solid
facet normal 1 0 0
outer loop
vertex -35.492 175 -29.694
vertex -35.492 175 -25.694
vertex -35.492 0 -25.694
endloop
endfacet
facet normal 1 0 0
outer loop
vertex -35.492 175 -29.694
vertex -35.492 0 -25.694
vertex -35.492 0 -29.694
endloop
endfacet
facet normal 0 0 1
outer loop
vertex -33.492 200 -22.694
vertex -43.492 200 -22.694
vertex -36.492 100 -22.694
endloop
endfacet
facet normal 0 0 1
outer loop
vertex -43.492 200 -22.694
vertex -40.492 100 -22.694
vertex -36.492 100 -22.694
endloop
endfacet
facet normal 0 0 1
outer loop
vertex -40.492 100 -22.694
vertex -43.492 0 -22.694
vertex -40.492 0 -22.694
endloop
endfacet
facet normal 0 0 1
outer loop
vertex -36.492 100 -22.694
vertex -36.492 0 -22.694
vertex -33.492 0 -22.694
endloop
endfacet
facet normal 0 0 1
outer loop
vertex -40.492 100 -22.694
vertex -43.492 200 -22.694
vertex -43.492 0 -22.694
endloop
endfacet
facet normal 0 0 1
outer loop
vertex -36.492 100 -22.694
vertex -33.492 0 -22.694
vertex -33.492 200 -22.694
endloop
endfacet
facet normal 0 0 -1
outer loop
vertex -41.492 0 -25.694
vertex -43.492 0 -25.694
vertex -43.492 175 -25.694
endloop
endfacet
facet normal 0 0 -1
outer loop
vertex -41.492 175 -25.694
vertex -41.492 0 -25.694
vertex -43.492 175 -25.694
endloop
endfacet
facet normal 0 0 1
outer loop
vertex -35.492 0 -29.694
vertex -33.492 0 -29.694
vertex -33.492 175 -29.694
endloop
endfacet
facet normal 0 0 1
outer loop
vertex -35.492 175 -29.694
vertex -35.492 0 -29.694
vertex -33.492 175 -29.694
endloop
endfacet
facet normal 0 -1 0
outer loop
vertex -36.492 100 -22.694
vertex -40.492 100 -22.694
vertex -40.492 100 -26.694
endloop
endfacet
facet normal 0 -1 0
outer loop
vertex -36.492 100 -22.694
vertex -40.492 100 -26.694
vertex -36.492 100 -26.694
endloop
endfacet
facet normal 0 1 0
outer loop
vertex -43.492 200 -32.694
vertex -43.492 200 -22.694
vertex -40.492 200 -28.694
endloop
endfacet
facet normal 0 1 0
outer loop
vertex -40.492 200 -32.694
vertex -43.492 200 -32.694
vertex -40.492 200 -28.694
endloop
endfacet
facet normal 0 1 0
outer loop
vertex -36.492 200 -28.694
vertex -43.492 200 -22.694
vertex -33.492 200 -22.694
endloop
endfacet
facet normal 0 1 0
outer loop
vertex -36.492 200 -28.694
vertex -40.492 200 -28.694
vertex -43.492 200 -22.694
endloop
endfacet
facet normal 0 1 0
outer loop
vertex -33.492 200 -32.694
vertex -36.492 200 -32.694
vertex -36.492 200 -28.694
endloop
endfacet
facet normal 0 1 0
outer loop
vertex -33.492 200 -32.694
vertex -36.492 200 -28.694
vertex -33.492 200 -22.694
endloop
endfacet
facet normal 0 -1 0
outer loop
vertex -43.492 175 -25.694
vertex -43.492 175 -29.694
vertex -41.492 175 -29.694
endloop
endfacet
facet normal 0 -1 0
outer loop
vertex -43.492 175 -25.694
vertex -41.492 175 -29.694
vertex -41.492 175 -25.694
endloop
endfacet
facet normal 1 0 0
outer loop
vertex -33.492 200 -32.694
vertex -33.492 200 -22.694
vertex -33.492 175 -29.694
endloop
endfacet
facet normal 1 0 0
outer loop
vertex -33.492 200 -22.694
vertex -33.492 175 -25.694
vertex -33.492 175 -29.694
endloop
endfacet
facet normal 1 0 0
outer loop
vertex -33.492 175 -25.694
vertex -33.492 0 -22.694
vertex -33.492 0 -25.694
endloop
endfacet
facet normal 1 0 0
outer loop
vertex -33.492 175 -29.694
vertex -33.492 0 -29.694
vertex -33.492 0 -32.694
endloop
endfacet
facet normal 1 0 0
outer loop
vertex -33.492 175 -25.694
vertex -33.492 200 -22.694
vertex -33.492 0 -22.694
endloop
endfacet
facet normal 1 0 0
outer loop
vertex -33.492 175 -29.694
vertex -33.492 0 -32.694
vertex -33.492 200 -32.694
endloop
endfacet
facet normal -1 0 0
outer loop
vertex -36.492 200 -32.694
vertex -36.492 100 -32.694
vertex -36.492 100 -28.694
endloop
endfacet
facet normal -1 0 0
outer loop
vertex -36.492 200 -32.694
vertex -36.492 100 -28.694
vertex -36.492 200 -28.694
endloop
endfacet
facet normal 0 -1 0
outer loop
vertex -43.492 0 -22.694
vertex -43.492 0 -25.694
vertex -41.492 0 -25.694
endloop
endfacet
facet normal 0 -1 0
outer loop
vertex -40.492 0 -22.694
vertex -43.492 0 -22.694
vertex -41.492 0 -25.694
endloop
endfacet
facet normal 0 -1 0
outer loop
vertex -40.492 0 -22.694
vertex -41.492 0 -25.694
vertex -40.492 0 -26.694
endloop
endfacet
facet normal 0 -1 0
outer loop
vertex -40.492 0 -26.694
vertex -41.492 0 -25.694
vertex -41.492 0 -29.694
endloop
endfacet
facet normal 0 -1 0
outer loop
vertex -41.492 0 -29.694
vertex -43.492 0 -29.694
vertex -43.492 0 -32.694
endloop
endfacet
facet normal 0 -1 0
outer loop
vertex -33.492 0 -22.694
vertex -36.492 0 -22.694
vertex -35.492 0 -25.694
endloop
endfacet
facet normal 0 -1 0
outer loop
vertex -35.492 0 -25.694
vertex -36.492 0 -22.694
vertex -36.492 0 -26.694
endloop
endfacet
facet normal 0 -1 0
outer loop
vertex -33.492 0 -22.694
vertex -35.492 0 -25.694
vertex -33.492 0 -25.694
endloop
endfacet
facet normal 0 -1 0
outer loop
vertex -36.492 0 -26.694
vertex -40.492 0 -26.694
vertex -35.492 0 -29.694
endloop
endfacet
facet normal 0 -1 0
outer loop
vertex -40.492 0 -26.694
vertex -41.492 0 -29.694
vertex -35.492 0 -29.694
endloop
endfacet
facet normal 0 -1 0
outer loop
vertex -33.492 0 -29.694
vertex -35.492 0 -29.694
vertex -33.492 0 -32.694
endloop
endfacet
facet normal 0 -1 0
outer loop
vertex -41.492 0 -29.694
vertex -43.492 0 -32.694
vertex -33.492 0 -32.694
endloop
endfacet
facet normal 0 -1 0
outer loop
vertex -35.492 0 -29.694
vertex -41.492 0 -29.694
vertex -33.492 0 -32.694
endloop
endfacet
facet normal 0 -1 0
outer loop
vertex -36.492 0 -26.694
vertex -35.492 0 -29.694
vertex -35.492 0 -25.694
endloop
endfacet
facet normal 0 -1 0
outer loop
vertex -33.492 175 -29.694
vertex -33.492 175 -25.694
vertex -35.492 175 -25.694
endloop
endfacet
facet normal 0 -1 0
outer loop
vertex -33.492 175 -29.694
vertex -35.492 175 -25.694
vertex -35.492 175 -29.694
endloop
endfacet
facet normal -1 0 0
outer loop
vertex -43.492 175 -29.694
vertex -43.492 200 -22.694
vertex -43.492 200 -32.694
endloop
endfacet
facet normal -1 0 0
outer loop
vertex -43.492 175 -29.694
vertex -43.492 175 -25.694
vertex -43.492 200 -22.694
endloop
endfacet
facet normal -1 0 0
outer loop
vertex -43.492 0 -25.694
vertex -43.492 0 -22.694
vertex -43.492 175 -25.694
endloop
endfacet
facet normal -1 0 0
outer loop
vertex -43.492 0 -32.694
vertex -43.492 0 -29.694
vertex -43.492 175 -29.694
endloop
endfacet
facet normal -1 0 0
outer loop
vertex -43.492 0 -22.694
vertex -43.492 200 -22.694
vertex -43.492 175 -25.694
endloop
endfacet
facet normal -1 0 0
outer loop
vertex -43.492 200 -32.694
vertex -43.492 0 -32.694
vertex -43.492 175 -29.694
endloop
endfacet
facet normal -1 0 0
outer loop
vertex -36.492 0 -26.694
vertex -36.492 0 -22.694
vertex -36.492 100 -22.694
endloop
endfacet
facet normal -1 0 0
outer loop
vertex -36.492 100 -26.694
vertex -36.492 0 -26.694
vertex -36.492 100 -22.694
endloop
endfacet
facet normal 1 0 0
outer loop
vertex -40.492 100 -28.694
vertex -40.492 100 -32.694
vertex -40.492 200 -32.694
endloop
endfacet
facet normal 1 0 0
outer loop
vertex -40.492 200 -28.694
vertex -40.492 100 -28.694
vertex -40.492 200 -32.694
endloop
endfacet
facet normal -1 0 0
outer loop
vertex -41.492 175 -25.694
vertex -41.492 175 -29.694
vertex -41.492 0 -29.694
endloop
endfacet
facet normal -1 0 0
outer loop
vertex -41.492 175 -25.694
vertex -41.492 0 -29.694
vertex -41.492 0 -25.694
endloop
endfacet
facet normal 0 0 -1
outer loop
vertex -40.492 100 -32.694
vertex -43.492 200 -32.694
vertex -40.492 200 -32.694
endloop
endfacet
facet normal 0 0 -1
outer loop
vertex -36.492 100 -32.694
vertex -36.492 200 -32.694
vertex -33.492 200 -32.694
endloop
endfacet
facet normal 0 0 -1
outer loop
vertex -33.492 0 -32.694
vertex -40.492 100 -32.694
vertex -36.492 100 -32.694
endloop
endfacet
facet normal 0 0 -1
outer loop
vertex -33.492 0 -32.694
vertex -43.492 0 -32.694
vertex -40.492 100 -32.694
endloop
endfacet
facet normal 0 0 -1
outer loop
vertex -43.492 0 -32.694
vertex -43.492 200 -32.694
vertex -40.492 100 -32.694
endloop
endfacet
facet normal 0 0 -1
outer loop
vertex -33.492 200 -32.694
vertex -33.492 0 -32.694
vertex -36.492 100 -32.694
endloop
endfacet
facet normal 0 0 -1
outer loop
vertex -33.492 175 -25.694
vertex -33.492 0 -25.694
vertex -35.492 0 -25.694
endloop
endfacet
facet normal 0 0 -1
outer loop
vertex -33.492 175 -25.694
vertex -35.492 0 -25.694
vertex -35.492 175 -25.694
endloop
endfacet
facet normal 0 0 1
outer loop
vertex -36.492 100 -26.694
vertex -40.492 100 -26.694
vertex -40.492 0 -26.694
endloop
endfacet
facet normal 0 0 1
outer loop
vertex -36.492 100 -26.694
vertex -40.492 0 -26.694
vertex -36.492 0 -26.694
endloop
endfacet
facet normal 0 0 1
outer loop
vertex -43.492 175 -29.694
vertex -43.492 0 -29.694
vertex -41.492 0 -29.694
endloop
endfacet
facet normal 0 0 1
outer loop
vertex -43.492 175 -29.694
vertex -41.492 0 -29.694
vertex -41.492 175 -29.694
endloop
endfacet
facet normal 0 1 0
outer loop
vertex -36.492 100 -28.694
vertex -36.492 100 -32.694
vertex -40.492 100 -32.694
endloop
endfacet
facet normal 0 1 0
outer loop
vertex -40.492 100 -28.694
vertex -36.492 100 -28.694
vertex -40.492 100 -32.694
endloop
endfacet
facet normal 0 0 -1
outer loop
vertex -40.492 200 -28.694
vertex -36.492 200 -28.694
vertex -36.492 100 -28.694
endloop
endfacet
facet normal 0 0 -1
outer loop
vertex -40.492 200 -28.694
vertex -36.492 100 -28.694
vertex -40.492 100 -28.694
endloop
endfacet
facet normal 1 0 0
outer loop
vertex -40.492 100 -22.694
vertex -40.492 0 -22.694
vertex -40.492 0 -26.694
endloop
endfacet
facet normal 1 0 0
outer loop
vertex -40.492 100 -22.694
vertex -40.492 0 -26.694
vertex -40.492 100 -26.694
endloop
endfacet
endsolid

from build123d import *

# Parameters (mm, degrees)
SKETCH1_W           = 10
SKETCH1_H           = 10
BOSS_EXTRUDE1_DEPTH = 200
SKETCH3_W           = 4
SKETCH3_H           = 100
CUT_EXTRUDE3_DEPTH  = 4
SKETCH5_W           = 4
SKETCH5_H           = 175
CUT_EXTRUDE4_DEPTH  = 2
SKETCH2_W           = 4
SKETCH2_H           = 100
CUT_EXTRUDE5_DEPTH  = 4
SKETCH4_W           = 4
SKETCH4_H           = 175
CUT_EXTRUDE6_DEPTH  = 2


with BuildPart() as part:
    # Sketch1 → Boss-Extrude1 (new body)
    with BuildSketch(Plane(origin=(0, 0, 0), x_dir=(1, 0, 0), z_dir=(0, 1, 0))):
        with Locations((-38.49189023, 27.694440025)):
            Rectangle(SKETCH1_W, SKETCH1_H)
    extrude(amount=BOSS_EXTRUDE1_DEPTH)

    # Sketch3 → Cut-Extrude3 (cut)
    with BuildSketch(Plane(origin=(0, 0, -32.694440025), x_dir=(-1, 0, 0), z_dir=(0, 0, -1))):
        with Locations((38.49189023, 150)):
            Rectangle(SKETCH3_W, SKETCH3_H)
    extrude(amount=-CUT_EXTRUDE3_DEPTH, mode=Mode.SUBTRACT)

    # Sketch5 → Cut-Extrude4 (cut)
    with BuildSketch(Plane.ZY.offset(43.49189023)):
        with Locations((-27.694440025, 87.5)):
            Rectangle(SKETCH5_W, SKETCH5_H)
    extrude(amount=-CUT_EXTRUDE4_DEPTH, mode=Mode.SUBTRACT)

    # Sketch2 → Cut-Extrude5 (cut)
    with BuildSketch(Plane.XY.offset(-22.694440025)):
        with Locations((-38.49189023, 50)):
            Rectangle(SKETCH2_W, SKETCH2_H)
    extrude(amount=-CUT_EXTRUDE5_DEPTH, mode=Mode.SUBTRACT)

    # Sketch4 → Cut-Extrude6 (cut)
    with BuildSketch(Plane(origin=(-33.49189023, 0, 0), x_dir=(0, 0, -1), z_dir=(1, 0, 0))):
        with Locations((27.694440025, 87.5)):
            Rectangle(SKETCH4_W, SKETCH4_H)
    extrude(amount=-CUT_EXTRUDE6_DEPTH, mode=Mode.SUBTRACT)


solid = part.part
